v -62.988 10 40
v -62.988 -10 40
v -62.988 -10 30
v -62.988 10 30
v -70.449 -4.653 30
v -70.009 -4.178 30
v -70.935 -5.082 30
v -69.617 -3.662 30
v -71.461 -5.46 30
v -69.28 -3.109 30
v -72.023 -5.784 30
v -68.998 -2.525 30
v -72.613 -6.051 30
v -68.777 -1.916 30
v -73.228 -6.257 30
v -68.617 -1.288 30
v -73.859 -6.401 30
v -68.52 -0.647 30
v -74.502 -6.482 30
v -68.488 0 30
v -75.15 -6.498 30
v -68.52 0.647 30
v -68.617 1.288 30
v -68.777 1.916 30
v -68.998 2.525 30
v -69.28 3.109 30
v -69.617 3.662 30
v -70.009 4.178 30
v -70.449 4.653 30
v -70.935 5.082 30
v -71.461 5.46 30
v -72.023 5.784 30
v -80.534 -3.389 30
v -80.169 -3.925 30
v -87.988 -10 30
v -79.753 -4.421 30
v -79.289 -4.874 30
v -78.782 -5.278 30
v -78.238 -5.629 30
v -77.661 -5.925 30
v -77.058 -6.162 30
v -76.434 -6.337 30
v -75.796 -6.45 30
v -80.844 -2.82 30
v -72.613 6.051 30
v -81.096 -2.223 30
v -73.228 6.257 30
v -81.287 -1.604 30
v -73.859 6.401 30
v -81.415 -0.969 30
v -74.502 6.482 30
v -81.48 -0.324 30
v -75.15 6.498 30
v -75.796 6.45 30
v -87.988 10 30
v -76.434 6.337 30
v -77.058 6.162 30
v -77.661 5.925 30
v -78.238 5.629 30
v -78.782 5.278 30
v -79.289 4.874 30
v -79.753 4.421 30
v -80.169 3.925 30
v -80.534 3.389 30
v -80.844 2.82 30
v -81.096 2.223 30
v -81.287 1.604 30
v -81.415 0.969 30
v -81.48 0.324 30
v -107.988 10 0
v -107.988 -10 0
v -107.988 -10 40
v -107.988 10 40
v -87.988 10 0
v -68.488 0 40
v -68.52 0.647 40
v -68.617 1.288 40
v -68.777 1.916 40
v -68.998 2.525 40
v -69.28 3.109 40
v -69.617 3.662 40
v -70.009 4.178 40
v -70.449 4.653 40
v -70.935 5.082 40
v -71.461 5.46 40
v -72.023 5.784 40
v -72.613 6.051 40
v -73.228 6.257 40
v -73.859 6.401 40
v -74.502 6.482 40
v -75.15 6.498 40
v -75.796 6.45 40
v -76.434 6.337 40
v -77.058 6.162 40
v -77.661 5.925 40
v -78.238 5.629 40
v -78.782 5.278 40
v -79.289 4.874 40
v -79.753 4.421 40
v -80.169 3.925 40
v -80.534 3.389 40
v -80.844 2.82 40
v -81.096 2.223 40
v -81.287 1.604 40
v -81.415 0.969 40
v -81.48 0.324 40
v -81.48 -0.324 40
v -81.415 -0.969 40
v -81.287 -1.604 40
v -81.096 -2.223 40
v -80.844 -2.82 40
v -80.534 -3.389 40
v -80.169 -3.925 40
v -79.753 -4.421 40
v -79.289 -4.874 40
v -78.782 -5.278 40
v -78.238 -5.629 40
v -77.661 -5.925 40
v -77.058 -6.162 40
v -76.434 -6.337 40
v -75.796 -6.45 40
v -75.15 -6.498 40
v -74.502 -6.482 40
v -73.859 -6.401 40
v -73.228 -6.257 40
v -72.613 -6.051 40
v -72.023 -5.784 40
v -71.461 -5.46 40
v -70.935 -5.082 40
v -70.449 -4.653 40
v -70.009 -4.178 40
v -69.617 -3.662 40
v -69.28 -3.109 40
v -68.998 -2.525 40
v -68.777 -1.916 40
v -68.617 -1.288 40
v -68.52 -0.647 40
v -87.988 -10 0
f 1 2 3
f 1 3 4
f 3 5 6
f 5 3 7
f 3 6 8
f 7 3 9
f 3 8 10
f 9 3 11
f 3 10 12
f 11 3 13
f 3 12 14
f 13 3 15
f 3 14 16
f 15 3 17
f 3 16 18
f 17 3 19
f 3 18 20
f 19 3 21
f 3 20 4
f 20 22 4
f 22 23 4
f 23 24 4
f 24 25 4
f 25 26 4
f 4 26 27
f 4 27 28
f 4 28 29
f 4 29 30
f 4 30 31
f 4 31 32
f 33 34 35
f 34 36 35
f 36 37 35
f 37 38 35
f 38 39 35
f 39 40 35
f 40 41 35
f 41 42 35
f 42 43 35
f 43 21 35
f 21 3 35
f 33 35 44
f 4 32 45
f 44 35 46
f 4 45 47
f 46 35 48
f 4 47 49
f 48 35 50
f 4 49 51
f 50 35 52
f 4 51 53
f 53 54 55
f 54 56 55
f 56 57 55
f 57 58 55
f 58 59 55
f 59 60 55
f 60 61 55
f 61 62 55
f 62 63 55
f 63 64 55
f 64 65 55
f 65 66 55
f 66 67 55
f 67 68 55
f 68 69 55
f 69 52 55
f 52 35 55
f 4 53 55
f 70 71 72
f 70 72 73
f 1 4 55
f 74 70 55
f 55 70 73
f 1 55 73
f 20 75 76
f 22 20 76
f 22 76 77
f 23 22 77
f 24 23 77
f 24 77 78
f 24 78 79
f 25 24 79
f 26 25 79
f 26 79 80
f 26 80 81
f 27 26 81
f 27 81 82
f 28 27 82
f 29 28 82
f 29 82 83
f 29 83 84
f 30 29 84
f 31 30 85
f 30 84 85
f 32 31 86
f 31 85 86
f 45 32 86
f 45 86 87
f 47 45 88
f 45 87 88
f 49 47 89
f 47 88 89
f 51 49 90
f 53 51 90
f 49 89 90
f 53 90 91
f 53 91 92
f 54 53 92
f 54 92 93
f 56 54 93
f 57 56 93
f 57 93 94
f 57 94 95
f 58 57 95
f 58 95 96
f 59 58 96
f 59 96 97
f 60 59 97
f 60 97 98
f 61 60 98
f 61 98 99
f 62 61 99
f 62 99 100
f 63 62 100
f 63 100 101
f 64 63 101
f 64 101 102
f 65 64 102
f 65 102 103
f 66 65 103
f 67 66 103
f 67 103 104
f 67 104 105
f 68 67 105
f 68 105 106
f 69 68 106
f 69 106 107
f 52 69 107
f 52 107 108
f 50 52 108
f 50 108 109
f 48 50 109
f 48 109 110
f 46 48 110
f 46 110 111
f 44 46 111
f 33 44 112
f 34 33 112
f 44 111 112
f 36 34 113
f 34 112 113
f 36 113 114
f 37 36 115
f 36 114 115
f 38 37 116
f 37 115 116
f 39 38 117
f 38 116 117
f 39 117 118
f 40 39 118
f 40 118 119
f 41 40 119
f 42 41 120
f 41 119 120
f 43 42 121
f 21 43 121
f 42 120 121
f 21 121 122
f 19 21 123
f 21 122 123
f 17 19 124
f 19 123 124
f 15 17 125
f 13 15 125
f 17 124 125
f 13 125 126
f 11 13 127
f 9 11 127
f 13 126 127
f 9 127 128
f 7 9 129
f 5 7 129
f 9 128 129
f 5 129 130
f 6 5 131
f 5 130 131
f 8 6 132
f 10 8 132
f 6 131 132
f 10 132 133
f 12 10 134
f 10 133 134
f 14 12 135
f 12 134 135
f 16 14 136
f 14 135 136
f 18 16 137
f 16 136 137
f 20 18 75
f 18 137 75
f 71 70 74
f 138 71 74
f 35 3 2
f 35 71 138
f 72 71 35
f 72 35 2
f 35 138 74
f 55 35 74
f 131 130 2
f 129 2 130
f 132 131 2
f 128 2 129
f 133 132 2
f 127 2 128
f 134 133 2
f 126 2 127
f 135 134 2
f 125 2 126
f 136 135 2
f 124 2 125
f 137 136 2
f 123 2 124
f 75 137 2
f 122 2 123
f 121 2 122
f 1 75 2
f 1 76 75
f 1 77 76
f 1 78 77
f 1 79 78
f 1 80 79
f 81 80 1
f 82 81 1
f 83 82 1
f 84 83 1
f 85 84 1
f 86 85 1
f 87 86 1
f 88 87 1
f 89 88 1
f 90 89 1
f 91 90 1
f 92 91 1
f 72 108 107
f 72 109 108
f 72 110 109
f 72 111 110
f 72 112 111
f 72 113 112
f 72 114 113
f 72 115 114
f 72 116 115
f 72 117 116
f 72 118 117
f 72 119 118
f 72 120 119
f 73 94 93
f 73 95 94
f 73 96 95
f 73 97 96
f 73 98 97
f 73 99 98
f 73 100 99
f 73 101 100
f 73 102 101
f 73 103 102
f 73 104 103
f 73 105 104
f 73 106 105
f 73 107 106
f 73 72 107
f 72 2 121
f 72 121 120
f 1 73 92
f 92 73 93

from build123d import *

# Parameters (mm, degrees)
F0_W     = 20
F0_H     = 20
F1_DEPTH = 40
F2_W     = 20
F2_H     = 10
F3_DEPTH = 25
F4_R     = 6.5
F5_DEPTH = 40.001


with BuildPart() as f1:
    # F0 (on Top) → F1 (new body)
    with BuildSketch(Plane.XY):
        with Locations((-97.988032, 0)):
            Rectangle(F0_W, F0_H)
    extrude(amount=F1_DEPTH)

    # F2 (on face) → F3 (join)
    with BuildSketch(Plane.YZ.offset(-87.988032)):
        with Locations((0, 35)):
            Rectangle(F2_W, F2_H)
    extrude(amount=F3_DEPTH)

    # F4 (on face) → F5 (cut, through all)
    with BuildSketch(Plane.XY.offset(40)):
        with Locations((-74.988032, 0)):
            Circle(F4_R)
    extrude(amount=-F5_DEPTH, mode=Mode.SUBTRACT)


solid = f1.part
